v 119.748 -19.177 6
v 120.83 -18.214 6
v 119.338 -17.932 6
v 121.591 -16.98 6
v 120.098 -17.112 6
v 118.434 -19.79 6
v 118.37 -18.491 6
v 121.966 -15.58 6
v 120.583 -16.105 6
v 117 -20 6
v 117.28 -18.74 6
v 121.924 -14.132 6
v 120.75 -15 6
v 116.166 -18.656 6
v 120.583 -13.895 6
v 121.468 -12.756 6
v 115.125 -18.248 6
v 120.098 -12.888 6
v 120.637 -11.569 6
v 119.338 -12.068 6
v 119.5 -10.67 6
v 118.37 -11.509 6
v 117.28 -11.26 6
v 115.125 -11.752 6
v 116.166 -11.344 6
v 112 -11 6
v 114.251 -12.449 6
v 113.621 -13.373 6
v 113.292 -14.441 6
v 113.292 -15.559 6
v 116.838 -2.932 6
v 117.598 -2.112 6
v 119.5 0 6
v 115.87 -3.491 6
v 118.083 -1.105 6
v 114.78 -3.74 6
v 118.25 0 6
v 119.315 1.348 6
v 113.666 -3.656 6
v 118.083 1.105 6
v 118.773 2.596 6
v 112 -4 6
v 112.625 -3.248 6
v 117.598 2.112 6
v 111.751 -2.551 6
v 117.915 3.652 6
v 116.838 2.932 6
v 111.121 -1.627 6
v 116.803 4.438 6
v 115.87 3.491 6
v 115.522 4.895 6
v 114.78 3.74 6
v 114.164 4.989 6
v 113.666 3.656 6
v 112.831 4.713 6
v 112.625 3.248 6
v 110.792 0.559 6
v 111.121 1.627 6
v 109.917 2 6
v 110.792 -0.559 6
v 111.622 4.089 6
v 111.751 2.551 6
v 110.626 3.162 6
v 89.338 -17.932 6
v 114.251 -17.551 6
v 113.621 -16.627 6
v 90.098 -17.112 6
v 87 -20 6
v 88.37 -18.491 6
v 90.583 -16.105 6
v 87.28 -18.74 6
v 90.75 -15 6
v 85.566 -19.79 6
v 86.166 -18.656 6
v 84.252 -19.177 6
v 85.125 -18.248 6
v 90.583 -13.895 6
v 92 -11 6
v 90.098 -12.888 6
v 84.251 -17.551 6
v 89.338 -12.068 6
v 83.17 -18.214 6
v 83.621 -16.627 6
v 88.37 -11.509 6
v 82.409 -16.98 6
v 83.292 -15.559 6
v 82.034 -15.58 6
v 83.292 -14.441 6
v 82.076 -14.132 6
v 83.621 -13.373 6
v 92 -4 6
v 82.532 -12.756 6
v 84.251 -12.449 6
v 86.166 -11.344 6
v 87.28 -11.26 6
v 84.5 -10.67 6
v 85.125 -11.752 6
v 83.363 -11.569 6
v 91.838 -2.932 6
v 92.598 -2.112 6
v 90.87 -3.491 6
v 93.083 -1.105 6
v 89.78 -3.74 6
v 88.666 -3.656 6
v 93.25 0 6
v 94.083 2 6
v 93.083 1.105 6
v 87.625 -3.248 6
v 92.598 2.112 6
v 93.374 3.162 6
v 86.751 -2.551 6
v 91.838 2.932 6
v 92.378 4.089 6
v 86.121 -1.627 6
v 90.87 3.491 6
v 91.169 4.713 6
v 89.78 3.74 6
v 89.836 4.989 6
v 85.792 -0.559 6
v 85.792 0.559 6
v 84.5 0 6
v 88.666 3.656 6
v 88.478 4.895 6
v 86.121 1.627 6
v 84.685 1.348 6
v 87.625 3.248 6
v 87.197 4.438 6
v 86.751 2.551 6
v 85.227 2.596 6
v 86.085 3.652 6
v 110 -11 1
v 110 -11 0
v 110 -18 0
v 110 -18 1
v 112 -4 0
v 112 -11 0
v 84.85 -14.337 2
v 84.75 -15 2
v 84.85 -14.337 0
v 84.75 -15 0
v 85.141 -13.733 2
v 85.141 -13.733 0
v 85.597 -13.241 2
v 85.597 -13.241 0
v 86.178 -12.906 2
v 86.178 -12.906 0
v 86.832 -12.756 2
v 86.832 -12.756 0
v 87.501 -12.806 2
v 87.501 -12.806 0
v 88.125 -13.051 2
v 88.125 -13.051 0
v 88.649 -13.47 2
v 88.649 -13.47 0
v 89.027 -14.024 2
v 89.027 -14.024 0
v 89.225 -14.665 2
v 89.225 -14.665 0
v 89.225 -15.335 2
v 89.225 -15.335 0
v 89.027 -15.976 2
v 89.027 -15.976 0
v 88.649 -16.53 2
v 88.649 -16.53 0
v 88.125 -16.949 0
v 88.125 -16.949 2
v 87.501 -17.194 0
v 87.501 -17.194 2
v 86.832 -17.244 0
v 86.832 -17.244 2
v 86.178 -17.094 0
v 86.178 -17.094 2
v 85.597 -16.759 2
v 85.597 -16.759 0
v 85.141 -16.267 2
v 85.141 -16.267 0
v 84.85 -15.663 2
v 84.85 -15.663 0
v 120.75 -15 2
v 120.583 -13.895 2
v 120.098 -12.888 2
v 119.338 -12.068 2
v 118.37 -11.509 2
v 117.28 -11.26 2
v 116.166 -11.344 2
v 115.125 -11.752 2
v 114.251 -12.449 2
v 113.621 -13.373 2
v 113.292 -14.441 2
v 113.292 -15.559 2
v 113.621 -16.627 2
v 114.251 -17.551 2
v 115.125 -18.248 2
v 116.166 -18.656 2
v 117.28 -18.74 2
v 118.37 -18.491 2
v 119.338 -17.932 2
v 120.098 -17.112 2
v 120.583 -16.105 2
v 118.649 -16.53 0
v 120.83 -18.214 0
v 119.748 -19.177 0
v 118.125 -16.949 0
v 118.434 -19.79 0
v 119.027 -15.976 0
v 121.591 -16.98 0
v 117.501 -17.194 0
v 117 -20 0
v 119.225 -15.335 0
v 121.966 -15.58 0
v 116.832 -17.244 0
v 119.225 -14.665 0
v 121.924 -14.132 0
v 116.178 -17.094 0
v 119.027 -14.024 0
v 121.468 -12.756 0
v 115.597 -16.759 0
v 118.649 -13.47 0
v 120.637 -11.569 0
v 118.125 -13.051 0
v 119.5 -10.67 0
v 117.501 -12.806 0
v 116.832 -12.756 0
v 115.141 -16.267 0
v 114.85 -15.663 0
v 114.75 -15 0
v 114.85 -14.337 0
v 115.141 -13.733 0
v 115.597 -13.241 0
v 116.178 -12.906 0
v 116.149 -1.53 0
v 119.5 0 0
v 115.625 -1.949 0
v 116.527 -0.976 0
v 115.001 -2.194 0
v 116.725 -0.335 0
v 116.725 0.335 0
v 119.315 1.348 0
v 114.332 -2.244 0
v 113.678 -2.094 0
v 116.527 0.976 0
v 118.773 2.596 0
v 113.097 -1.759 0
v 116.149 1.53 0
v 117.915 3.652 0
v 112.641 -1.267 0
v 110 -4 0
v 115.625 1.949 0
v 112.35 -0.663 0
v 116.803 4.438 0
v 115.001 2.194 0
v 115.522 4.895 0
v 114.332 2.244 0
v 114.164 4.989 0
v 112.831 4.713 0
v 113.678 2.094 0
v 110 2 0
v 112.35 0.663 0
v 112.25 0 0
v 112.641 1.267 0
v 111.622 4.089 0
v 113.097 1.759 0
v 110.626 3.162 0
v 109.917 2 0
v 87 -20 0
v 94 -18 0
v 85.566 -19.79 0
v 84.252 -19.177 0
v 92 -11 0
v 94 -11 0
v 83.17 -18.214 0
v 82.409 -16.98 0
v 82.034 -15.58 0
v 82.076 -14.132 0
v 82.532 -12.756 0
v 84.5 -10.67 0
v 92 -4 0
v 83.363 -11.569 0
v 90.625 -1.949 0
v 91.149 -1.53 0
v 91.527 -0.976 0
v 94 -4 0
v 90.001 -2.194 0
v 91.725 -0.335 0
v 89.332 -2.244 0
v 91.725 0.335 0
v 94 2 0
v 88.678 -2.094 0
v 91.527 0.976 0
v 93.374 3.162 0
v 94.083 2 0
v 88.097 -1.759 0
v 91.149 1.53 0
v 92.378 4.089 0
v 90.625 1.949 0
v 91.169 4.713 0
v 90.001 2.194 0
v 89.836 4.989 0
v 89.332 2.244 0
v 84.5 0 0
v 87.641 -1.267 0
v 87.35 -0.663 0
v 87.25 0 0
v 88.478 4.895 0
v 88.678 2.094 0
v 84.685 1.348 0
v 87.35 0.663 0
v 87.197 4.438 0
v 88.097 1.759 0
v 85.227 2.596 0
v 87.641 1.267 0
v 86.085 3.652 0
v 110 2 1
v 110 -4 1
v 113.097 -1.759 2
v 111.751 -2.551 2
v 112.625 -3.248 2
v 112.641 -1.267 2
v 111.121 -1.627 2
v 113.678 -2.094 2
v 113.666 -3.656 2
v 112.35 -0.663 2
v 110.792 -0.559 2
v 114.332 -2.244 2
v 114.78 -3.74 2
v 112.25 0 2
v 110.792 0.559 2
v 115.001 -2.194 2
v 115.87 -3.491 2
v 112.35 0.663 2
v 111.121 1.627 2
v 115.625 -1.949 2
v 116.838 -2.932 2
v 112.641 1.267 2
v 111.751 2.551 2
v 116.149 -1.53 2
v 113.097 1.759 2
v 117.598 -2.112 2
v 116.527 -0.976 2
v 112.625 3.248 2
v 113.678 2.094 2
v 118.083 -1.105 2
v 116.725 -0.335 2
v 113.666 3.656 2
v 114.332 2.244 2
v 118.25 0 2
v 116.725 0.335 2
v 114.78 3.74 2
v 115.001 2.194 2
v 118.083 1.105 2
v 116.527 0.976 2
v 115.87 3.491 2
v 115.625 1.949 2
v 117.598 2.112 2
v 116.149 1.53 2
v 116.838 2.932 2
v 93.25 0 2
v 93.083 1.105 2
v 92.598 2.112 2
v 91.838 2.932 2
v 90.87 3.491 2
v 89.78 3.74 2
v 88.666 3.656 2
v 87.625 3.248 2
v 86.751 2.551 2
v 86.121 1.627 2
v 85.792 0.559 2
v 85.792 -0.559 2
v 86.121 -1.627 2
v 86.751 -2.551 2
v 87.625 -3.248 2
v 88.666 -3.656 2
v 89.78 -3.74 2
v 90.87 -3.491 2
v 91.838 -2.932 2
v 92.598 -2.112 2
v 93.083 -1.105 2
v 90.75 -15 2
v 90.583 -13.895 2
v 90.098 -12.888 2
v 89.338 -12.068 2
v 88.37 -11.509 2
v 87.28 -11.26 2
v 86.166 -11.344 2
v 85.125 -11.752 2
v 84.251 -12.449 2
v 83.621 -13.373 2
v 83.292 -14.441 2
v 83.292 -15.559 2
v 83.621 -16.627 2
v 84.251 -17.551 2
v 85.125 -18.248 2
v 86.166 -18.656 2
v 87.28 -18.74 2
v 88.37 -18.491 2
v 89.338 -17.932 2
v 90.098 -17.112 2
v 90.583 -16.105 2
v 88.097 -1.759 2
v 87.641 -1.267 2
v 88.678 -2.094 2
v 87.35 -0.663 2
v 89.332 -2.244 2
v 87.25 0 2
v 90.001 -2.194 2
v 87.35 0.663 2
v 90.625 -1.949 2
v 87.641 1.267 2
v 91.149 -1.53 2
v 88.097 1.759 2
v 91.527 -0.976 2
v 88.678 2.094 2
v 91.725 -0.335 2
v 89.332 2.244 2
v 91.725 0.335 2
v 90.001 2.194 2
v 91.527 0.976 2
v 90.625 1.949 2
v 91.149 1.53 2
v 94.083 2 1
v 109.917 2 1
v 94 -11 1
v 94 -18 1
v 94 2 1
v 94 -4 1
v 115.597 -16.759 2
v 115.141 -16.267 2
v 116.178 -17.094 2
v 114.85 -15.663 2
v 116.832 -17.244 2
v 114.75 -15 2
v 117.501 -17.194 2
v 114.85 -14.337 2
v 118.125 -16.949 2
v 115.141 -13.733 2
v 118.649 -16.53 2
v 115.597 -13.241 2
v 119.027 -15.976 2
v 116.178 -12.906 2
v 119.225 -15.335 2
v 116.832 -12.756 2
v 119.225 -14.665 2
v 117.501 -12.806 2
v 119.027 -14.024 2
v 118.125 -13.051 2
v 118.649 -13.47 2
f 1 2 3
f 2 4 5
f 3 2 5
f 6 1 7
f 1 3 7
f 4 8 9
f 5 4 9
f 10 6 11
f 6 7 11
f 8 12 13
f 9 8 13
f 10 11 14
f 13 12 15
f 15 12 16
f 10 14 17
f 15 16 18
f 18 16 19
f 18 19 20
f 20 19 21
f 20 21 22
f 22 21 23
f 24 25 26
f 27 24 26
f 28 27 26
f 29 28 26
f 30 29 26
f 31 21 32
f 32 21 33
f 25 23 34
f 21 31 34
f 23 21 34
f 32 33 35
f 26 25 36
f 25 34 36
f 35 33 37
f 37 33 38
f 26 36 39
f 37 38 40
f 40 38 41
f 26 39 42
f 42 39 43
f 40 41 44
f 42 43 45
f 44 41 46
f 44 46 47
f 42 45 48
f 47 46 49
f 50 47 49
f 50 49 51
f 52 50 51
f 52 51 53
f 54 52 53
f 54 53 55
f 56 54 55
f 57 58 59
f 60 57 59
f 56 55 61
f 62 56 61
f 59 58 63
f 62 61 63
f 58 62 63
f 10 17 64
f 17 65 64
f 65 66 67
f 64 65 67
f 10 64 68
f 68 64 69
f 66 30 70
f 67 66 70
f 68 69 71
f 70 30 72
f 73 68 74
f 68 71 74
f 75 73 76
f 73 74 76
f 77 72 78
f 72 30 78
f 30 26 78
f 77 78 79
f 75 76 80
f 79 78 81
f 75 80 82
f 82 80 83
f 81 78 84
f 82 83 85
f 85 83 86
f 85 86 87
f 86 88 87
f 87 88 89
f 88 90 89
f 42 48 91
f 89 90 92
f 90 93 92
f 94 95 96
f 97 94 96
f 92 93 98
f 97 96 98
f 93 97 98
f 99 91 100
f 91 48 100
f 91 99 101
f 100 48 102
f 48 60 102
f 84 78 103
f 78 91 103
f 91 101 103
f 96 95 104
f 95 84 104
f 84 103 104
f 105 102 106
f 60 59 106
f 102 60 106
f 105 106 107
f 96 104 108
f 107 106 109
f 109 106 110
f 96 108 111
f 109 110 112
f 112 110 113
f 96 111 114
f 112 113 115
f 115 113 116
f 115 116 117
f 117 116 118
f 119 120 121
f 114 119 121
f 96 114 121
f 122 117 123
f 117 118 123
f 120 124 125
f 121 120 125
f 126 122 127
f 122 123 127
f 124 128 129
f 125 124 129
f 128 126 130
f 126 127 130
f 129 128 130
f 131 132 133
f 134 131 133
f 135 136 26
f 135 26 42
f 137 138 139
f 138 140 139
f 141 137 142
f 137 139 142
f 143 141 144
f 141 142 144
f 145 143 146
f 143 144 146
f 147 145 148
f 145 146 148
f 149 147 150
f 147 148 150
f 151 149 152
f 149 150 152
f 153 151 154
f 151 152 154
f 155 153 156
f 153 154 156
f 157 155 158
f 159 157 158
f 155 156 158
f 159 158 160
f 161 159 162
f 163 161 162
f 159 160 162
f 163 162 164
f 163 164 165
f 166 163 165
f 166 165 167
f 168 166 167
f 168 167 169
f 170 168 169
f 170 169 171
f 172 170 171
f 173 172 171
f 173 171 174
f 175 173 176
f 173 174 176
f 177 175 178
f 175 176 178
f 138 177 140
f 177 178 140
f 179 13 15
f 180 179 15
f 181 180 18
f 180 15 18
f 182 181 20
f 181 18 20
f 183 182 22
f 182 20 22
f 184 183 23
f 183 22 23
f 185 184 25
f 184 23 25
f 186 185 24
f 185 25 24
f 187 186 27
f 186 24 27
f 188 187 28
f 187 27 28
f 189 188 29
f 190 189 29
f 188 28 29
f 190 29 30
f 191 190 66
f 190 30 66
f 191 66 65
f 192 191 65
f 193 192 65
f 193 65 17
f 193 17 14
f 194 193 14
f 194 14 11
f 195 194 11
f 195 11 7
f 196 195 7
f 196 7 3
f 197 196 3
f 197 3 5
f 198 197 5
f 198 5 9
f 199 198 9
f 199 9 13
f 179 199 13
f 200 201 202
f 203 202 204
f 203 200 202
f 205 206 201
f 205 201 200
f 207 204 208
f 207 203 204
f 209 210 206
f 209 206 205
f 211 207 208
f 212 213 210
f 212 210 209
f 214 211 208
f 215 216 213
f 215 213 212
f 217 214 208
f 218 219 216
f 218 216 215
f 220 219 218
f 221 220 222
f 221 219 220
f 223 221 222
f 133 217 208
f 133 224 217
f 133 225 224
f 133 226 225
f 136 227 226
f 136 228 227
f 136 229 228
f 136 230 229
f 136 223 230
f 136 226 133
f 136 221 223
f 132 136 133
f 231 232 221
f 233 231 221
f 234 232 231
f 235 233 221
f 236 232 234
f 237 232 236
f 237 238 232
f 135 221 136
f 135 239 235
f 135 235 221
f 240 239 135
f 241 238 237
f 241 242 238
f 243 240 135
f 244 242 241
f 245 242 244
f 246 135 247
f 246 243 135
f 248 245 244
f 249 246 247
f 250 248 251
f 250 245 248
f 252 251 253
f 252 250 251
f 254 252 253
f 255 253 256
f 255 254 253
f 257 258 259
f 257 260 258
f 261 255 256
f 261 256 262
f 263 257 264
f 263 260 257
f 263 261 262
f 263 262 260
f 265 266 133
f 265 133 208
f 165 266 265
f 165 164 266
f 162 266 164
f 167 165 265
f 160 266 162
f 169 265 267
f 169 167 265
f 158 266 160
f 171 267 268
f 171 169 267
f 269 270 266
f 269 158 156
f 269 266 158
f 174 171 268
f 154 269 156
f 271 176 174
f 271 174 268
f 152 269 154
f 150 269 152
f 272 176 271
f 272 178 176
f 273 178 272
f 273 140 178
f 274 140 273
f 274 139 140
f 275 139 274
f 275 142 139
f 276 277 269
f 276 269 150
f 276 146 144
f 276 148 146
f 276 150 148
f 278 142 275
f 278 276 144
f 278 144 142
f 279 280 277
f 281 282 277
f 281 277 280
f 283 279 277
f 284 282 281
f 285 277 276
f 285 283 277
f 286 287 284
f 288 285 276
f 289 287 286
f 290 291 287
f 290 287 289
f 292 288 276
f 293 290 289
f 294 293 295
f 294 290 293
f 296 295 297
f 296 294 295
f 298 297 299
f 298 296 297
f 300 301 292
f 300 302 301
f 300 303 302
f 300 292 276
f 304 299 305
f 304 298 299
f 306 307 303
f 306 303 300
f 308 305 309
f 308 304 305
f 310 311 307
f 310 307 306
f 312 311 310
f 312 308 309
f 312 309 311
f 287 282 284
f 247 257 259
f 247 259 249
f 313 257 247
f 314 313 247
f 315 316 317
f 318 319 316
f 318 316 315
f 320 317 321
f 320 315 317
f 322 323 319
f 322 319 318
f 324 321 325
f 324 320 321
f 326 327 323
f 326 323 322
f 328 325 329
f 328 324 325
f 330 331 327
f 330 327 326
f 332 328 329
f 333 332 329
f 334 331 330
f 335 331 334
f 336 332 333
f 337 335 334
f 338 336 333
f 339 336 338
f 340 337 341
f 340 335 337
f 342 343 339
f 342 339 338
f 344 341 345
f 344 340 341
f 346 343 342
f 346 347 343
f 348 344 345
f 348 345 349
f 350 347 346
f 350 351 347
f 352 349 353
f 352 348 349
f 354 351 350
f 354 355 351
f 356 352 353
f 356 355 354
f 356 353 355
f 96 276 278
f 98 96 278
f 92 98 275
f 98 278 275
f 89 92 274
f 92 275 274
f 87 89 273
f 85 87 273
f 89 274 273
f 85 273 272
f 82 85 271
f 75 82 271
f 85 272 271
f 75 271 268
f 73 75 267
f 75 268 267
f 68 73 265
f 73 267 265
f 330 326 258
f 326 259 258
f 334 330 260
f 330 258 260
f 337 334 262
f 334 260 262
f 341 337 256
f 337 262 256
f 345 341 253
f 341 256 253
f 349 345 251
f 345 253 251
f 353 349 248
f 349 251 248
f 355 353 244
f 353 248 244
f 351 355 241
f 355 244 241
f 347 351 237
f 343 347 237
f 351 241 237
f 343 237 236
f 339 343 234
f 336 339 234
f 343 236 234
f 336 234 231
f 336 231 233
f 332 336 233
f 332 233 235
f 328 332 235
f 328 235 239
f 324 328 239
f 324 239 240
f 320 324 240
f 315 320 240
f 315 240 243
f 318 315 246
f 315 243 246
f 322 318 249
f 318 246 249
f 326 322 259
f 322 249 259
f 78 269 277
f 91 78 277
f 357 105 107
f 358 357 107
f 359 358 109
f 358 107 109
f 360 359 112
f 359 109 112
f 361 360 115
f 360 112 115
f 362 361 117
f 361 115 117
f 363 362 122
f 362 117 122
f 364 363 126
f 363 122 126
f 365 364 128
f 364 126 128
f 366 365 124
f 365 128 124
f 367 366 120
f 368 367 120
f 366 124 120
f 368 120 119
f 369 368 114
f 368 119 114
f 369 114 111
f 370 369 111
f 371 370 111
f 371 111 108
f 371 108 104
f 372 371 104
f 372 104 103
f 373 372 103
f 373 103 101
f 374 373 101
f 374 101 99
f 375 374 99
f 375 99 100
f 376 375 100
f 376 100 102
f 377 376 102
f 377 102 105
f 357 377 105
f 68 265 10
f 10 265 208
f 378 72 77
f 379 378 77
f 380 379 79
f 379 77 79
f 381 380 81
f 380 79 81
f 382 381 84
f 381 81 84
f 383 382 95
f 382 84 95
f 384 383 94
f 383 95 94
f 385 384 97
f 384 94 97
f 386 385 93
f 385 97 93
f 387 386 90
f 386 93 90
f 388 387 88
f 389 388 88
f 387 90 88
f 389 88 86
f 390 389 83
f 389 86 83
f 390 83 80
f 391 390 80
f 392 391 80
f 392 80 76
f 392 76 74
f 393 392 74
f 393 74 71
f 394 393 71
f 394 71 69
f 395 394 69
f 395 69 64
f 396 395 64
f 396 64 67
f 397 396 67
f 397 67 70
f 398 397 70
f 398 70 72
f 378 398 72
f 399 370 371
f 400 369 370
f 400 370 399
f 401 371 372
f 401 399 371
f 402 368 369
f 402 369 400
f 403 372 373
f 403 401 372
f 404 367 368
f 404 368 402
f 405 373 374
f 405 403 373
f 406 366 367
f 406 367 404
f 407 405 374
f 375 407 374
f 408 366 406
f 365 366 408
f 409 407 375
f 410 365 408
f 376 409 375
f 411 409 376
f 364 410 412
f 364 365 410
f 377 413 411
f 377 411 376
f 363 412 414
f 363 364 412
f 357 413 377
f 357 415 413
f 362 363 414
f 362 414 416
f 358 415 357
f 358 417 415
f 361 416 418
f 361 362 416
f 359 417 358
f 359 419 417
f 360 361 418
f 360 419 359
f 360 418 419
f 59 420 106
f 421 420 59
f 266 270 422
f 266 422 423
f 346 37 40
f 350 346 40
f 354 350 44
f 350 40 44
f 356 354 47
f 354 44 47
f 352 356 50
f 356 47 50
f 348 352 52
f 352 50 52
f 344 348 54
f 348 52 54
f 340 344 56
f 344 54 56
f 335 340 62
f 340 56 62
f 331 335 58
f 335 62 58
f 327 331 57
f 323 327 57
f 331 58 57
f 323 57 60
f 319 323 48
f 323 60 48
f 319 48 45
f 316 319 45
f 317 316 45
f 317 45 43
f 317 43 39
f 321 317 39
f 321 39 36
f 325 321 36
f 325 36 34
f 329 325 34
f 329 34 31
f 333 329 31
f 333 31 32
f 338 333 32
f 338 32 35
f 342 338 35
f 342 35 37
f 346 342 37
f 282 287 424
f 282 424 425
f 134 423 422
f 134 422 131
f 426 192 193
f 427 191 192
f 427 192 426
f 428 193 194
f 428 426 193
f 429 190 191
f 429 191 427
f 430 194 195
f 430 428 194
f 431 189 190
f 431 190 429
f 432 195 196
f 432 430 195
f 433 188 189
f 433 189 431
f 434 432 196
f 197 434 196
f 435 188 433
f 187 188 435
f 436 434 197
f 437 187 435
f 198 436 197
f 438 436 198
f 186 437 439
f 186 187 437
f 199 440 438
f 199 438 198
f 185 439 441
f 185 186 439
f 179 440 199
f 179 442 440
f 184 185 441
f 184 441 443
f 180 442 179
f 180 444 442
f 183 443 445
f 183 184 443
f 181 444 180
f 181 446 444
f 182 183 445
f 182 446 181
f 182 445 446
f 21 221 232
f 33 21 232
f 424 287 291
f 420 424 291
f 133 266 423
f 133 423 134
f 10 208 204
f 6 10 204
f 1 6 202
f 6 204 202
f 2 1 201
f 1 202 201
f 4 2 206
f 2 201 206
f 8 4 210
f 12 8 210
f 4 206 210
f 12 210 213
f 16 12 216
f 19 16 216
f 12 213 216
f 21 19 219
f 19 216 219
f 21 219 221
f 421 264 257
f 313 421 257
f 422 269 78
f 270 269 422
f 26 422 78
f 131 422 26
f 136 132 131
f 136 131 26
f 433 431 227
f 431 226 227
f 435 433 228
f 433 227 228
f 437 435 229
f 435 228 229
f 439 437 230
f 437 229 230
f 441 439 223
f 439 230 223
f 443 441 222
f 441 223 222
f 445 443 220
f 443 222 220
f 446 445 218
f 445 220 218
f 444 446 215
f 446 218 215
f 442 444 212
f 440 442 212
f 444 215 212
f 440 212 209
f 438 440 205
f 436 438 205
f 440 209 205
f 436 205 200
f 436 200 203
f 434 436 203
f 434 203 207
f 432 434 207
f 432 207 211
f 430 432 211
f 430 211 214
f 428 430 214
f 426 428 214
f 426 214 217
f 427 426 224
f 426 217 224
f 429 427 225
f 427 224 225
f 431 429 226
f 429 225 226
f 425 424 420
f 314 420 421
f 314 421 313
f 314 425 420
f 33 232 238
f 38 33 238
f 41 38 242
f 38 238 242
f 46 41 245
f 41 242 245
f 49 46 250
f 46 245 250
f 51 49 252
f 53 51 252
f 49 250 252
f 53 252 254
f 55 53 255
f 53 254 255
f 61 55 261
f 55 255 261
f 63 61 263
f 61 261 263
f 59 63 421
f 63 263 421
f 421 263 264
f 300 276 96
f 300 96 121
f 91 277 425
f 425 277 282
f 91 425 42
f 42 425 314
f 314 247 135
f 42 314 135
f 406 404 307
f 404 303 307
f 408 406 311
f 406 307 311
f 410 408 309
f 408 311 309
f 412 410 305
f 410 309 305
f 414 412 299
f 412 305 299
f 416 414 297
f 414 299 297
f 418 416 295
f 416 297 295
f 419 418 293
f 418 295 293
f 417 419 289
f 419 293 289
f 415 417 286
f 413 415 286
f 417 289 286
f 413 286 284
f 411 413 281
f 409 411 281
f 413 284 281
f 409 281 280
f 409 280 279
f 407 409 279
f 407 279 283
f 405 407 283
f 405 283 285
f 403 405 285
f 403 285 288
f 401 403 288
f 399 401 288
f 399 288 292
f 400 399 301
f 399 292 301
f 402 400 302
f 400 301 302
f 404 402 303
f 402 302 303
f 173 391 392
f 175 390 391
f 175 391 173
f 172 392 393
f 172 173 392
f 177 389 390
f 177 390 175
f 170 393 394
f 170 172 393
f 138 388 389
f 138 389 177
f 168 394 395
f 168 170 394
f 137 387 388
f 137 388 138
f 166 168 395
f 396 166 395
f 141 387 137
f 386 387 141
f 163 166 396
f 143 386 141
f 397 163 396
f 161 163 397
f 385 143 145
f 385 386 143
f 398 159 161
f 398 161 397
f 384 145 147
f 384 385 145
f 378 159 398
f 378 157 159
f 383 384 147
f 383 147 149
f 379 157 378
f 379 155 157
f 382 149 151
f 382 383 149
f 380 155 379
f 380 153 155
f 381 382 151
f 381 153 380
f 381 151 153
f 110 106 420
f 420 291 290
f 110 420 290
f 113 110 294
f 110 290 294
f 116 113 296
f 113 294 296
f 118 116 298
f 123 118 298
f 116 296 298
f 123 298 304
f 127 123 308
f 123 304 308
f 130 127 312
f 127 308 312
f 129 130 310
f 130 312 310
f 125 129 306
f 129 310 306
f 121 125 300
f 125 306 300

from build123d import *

# Parameters (mm, degrees)
SKETCH155_W         = 20
SKETCH155_H         = 7
PAD067_DEPTH        = 6
HOLE009_D           = 4.5
HOLE009_DEPTH       = 25
HOLE009_CBORE_D     = 7.5
HOLE009_CBORE_DEPTH = 4
SKETCH275_W         = 16
SKETCH275_H         = 20
POCKET114_DEPTH     = 1


with BuildPart() as part:
    # Sketch155 → Pad067 (new body)
    with BuildSketch(Plane.XY):
        with BuildLine():
            Line((-7.917424, 2), (7.917424, 2))
            ThreePointArc((17.5, 0), (13.521548, 4.894532), (7.917424, 2))
            Line((17.5, -10.669873), (17.5, 0))
            ThreePointArc((15, -20), (19.829629, -16.294095), (17.5, -10.669873))
            Line((-14.999993, -20), (15, -20))
            ThreePointArc((-17.5, -10.669873), (-19.829628, -16.294099), (-14.999993, -20))
            Line((-17.5, -10.669873), (-17.5, 0))
            ThreePointArc((-7.917424, 2), (-13.521548, 4.894532), (-17.5, 0))
        make_face()
        with Locations((0, -7.5)):
            Rectangle(SKETCH155_W, SKETCH155_H, mode=Mode.SUBTRACT)
    extrude(amount=PAD067_DEPTH)

    # Hole009
    with Locations(Plane.XY.offset(6)):
        with Locations((-12.5, 0), (12.5, 0), (15, -15), (-15, -15)):
            CounterBoreHole(HOLE009_D / 2, HOLE009_CBORE_D / 2, HOLE009_CBORE_DEPTH, depth=HOLE009_DEPTH)

    # Sketch275 (on Face4 of Hole009) → Pocket114 (cut)
    with BuildSketch(Plane(origin=(0, 0, 0), x_dir=(1, 0, 0), z_dir=(0, 0, -1))):
        with Locations((0, 8)):
            Rectangle(SKETCH275_W, SKETCH275_H)
    extrude(amount=-POCKET114_DEPTH, mode=Mode.SUBTRACT)


with BuildPart() as part_1:
    # Body019 placement: moved
    add(part.part.moved(Location((102, 0, 0))))


solid = part_1.part
